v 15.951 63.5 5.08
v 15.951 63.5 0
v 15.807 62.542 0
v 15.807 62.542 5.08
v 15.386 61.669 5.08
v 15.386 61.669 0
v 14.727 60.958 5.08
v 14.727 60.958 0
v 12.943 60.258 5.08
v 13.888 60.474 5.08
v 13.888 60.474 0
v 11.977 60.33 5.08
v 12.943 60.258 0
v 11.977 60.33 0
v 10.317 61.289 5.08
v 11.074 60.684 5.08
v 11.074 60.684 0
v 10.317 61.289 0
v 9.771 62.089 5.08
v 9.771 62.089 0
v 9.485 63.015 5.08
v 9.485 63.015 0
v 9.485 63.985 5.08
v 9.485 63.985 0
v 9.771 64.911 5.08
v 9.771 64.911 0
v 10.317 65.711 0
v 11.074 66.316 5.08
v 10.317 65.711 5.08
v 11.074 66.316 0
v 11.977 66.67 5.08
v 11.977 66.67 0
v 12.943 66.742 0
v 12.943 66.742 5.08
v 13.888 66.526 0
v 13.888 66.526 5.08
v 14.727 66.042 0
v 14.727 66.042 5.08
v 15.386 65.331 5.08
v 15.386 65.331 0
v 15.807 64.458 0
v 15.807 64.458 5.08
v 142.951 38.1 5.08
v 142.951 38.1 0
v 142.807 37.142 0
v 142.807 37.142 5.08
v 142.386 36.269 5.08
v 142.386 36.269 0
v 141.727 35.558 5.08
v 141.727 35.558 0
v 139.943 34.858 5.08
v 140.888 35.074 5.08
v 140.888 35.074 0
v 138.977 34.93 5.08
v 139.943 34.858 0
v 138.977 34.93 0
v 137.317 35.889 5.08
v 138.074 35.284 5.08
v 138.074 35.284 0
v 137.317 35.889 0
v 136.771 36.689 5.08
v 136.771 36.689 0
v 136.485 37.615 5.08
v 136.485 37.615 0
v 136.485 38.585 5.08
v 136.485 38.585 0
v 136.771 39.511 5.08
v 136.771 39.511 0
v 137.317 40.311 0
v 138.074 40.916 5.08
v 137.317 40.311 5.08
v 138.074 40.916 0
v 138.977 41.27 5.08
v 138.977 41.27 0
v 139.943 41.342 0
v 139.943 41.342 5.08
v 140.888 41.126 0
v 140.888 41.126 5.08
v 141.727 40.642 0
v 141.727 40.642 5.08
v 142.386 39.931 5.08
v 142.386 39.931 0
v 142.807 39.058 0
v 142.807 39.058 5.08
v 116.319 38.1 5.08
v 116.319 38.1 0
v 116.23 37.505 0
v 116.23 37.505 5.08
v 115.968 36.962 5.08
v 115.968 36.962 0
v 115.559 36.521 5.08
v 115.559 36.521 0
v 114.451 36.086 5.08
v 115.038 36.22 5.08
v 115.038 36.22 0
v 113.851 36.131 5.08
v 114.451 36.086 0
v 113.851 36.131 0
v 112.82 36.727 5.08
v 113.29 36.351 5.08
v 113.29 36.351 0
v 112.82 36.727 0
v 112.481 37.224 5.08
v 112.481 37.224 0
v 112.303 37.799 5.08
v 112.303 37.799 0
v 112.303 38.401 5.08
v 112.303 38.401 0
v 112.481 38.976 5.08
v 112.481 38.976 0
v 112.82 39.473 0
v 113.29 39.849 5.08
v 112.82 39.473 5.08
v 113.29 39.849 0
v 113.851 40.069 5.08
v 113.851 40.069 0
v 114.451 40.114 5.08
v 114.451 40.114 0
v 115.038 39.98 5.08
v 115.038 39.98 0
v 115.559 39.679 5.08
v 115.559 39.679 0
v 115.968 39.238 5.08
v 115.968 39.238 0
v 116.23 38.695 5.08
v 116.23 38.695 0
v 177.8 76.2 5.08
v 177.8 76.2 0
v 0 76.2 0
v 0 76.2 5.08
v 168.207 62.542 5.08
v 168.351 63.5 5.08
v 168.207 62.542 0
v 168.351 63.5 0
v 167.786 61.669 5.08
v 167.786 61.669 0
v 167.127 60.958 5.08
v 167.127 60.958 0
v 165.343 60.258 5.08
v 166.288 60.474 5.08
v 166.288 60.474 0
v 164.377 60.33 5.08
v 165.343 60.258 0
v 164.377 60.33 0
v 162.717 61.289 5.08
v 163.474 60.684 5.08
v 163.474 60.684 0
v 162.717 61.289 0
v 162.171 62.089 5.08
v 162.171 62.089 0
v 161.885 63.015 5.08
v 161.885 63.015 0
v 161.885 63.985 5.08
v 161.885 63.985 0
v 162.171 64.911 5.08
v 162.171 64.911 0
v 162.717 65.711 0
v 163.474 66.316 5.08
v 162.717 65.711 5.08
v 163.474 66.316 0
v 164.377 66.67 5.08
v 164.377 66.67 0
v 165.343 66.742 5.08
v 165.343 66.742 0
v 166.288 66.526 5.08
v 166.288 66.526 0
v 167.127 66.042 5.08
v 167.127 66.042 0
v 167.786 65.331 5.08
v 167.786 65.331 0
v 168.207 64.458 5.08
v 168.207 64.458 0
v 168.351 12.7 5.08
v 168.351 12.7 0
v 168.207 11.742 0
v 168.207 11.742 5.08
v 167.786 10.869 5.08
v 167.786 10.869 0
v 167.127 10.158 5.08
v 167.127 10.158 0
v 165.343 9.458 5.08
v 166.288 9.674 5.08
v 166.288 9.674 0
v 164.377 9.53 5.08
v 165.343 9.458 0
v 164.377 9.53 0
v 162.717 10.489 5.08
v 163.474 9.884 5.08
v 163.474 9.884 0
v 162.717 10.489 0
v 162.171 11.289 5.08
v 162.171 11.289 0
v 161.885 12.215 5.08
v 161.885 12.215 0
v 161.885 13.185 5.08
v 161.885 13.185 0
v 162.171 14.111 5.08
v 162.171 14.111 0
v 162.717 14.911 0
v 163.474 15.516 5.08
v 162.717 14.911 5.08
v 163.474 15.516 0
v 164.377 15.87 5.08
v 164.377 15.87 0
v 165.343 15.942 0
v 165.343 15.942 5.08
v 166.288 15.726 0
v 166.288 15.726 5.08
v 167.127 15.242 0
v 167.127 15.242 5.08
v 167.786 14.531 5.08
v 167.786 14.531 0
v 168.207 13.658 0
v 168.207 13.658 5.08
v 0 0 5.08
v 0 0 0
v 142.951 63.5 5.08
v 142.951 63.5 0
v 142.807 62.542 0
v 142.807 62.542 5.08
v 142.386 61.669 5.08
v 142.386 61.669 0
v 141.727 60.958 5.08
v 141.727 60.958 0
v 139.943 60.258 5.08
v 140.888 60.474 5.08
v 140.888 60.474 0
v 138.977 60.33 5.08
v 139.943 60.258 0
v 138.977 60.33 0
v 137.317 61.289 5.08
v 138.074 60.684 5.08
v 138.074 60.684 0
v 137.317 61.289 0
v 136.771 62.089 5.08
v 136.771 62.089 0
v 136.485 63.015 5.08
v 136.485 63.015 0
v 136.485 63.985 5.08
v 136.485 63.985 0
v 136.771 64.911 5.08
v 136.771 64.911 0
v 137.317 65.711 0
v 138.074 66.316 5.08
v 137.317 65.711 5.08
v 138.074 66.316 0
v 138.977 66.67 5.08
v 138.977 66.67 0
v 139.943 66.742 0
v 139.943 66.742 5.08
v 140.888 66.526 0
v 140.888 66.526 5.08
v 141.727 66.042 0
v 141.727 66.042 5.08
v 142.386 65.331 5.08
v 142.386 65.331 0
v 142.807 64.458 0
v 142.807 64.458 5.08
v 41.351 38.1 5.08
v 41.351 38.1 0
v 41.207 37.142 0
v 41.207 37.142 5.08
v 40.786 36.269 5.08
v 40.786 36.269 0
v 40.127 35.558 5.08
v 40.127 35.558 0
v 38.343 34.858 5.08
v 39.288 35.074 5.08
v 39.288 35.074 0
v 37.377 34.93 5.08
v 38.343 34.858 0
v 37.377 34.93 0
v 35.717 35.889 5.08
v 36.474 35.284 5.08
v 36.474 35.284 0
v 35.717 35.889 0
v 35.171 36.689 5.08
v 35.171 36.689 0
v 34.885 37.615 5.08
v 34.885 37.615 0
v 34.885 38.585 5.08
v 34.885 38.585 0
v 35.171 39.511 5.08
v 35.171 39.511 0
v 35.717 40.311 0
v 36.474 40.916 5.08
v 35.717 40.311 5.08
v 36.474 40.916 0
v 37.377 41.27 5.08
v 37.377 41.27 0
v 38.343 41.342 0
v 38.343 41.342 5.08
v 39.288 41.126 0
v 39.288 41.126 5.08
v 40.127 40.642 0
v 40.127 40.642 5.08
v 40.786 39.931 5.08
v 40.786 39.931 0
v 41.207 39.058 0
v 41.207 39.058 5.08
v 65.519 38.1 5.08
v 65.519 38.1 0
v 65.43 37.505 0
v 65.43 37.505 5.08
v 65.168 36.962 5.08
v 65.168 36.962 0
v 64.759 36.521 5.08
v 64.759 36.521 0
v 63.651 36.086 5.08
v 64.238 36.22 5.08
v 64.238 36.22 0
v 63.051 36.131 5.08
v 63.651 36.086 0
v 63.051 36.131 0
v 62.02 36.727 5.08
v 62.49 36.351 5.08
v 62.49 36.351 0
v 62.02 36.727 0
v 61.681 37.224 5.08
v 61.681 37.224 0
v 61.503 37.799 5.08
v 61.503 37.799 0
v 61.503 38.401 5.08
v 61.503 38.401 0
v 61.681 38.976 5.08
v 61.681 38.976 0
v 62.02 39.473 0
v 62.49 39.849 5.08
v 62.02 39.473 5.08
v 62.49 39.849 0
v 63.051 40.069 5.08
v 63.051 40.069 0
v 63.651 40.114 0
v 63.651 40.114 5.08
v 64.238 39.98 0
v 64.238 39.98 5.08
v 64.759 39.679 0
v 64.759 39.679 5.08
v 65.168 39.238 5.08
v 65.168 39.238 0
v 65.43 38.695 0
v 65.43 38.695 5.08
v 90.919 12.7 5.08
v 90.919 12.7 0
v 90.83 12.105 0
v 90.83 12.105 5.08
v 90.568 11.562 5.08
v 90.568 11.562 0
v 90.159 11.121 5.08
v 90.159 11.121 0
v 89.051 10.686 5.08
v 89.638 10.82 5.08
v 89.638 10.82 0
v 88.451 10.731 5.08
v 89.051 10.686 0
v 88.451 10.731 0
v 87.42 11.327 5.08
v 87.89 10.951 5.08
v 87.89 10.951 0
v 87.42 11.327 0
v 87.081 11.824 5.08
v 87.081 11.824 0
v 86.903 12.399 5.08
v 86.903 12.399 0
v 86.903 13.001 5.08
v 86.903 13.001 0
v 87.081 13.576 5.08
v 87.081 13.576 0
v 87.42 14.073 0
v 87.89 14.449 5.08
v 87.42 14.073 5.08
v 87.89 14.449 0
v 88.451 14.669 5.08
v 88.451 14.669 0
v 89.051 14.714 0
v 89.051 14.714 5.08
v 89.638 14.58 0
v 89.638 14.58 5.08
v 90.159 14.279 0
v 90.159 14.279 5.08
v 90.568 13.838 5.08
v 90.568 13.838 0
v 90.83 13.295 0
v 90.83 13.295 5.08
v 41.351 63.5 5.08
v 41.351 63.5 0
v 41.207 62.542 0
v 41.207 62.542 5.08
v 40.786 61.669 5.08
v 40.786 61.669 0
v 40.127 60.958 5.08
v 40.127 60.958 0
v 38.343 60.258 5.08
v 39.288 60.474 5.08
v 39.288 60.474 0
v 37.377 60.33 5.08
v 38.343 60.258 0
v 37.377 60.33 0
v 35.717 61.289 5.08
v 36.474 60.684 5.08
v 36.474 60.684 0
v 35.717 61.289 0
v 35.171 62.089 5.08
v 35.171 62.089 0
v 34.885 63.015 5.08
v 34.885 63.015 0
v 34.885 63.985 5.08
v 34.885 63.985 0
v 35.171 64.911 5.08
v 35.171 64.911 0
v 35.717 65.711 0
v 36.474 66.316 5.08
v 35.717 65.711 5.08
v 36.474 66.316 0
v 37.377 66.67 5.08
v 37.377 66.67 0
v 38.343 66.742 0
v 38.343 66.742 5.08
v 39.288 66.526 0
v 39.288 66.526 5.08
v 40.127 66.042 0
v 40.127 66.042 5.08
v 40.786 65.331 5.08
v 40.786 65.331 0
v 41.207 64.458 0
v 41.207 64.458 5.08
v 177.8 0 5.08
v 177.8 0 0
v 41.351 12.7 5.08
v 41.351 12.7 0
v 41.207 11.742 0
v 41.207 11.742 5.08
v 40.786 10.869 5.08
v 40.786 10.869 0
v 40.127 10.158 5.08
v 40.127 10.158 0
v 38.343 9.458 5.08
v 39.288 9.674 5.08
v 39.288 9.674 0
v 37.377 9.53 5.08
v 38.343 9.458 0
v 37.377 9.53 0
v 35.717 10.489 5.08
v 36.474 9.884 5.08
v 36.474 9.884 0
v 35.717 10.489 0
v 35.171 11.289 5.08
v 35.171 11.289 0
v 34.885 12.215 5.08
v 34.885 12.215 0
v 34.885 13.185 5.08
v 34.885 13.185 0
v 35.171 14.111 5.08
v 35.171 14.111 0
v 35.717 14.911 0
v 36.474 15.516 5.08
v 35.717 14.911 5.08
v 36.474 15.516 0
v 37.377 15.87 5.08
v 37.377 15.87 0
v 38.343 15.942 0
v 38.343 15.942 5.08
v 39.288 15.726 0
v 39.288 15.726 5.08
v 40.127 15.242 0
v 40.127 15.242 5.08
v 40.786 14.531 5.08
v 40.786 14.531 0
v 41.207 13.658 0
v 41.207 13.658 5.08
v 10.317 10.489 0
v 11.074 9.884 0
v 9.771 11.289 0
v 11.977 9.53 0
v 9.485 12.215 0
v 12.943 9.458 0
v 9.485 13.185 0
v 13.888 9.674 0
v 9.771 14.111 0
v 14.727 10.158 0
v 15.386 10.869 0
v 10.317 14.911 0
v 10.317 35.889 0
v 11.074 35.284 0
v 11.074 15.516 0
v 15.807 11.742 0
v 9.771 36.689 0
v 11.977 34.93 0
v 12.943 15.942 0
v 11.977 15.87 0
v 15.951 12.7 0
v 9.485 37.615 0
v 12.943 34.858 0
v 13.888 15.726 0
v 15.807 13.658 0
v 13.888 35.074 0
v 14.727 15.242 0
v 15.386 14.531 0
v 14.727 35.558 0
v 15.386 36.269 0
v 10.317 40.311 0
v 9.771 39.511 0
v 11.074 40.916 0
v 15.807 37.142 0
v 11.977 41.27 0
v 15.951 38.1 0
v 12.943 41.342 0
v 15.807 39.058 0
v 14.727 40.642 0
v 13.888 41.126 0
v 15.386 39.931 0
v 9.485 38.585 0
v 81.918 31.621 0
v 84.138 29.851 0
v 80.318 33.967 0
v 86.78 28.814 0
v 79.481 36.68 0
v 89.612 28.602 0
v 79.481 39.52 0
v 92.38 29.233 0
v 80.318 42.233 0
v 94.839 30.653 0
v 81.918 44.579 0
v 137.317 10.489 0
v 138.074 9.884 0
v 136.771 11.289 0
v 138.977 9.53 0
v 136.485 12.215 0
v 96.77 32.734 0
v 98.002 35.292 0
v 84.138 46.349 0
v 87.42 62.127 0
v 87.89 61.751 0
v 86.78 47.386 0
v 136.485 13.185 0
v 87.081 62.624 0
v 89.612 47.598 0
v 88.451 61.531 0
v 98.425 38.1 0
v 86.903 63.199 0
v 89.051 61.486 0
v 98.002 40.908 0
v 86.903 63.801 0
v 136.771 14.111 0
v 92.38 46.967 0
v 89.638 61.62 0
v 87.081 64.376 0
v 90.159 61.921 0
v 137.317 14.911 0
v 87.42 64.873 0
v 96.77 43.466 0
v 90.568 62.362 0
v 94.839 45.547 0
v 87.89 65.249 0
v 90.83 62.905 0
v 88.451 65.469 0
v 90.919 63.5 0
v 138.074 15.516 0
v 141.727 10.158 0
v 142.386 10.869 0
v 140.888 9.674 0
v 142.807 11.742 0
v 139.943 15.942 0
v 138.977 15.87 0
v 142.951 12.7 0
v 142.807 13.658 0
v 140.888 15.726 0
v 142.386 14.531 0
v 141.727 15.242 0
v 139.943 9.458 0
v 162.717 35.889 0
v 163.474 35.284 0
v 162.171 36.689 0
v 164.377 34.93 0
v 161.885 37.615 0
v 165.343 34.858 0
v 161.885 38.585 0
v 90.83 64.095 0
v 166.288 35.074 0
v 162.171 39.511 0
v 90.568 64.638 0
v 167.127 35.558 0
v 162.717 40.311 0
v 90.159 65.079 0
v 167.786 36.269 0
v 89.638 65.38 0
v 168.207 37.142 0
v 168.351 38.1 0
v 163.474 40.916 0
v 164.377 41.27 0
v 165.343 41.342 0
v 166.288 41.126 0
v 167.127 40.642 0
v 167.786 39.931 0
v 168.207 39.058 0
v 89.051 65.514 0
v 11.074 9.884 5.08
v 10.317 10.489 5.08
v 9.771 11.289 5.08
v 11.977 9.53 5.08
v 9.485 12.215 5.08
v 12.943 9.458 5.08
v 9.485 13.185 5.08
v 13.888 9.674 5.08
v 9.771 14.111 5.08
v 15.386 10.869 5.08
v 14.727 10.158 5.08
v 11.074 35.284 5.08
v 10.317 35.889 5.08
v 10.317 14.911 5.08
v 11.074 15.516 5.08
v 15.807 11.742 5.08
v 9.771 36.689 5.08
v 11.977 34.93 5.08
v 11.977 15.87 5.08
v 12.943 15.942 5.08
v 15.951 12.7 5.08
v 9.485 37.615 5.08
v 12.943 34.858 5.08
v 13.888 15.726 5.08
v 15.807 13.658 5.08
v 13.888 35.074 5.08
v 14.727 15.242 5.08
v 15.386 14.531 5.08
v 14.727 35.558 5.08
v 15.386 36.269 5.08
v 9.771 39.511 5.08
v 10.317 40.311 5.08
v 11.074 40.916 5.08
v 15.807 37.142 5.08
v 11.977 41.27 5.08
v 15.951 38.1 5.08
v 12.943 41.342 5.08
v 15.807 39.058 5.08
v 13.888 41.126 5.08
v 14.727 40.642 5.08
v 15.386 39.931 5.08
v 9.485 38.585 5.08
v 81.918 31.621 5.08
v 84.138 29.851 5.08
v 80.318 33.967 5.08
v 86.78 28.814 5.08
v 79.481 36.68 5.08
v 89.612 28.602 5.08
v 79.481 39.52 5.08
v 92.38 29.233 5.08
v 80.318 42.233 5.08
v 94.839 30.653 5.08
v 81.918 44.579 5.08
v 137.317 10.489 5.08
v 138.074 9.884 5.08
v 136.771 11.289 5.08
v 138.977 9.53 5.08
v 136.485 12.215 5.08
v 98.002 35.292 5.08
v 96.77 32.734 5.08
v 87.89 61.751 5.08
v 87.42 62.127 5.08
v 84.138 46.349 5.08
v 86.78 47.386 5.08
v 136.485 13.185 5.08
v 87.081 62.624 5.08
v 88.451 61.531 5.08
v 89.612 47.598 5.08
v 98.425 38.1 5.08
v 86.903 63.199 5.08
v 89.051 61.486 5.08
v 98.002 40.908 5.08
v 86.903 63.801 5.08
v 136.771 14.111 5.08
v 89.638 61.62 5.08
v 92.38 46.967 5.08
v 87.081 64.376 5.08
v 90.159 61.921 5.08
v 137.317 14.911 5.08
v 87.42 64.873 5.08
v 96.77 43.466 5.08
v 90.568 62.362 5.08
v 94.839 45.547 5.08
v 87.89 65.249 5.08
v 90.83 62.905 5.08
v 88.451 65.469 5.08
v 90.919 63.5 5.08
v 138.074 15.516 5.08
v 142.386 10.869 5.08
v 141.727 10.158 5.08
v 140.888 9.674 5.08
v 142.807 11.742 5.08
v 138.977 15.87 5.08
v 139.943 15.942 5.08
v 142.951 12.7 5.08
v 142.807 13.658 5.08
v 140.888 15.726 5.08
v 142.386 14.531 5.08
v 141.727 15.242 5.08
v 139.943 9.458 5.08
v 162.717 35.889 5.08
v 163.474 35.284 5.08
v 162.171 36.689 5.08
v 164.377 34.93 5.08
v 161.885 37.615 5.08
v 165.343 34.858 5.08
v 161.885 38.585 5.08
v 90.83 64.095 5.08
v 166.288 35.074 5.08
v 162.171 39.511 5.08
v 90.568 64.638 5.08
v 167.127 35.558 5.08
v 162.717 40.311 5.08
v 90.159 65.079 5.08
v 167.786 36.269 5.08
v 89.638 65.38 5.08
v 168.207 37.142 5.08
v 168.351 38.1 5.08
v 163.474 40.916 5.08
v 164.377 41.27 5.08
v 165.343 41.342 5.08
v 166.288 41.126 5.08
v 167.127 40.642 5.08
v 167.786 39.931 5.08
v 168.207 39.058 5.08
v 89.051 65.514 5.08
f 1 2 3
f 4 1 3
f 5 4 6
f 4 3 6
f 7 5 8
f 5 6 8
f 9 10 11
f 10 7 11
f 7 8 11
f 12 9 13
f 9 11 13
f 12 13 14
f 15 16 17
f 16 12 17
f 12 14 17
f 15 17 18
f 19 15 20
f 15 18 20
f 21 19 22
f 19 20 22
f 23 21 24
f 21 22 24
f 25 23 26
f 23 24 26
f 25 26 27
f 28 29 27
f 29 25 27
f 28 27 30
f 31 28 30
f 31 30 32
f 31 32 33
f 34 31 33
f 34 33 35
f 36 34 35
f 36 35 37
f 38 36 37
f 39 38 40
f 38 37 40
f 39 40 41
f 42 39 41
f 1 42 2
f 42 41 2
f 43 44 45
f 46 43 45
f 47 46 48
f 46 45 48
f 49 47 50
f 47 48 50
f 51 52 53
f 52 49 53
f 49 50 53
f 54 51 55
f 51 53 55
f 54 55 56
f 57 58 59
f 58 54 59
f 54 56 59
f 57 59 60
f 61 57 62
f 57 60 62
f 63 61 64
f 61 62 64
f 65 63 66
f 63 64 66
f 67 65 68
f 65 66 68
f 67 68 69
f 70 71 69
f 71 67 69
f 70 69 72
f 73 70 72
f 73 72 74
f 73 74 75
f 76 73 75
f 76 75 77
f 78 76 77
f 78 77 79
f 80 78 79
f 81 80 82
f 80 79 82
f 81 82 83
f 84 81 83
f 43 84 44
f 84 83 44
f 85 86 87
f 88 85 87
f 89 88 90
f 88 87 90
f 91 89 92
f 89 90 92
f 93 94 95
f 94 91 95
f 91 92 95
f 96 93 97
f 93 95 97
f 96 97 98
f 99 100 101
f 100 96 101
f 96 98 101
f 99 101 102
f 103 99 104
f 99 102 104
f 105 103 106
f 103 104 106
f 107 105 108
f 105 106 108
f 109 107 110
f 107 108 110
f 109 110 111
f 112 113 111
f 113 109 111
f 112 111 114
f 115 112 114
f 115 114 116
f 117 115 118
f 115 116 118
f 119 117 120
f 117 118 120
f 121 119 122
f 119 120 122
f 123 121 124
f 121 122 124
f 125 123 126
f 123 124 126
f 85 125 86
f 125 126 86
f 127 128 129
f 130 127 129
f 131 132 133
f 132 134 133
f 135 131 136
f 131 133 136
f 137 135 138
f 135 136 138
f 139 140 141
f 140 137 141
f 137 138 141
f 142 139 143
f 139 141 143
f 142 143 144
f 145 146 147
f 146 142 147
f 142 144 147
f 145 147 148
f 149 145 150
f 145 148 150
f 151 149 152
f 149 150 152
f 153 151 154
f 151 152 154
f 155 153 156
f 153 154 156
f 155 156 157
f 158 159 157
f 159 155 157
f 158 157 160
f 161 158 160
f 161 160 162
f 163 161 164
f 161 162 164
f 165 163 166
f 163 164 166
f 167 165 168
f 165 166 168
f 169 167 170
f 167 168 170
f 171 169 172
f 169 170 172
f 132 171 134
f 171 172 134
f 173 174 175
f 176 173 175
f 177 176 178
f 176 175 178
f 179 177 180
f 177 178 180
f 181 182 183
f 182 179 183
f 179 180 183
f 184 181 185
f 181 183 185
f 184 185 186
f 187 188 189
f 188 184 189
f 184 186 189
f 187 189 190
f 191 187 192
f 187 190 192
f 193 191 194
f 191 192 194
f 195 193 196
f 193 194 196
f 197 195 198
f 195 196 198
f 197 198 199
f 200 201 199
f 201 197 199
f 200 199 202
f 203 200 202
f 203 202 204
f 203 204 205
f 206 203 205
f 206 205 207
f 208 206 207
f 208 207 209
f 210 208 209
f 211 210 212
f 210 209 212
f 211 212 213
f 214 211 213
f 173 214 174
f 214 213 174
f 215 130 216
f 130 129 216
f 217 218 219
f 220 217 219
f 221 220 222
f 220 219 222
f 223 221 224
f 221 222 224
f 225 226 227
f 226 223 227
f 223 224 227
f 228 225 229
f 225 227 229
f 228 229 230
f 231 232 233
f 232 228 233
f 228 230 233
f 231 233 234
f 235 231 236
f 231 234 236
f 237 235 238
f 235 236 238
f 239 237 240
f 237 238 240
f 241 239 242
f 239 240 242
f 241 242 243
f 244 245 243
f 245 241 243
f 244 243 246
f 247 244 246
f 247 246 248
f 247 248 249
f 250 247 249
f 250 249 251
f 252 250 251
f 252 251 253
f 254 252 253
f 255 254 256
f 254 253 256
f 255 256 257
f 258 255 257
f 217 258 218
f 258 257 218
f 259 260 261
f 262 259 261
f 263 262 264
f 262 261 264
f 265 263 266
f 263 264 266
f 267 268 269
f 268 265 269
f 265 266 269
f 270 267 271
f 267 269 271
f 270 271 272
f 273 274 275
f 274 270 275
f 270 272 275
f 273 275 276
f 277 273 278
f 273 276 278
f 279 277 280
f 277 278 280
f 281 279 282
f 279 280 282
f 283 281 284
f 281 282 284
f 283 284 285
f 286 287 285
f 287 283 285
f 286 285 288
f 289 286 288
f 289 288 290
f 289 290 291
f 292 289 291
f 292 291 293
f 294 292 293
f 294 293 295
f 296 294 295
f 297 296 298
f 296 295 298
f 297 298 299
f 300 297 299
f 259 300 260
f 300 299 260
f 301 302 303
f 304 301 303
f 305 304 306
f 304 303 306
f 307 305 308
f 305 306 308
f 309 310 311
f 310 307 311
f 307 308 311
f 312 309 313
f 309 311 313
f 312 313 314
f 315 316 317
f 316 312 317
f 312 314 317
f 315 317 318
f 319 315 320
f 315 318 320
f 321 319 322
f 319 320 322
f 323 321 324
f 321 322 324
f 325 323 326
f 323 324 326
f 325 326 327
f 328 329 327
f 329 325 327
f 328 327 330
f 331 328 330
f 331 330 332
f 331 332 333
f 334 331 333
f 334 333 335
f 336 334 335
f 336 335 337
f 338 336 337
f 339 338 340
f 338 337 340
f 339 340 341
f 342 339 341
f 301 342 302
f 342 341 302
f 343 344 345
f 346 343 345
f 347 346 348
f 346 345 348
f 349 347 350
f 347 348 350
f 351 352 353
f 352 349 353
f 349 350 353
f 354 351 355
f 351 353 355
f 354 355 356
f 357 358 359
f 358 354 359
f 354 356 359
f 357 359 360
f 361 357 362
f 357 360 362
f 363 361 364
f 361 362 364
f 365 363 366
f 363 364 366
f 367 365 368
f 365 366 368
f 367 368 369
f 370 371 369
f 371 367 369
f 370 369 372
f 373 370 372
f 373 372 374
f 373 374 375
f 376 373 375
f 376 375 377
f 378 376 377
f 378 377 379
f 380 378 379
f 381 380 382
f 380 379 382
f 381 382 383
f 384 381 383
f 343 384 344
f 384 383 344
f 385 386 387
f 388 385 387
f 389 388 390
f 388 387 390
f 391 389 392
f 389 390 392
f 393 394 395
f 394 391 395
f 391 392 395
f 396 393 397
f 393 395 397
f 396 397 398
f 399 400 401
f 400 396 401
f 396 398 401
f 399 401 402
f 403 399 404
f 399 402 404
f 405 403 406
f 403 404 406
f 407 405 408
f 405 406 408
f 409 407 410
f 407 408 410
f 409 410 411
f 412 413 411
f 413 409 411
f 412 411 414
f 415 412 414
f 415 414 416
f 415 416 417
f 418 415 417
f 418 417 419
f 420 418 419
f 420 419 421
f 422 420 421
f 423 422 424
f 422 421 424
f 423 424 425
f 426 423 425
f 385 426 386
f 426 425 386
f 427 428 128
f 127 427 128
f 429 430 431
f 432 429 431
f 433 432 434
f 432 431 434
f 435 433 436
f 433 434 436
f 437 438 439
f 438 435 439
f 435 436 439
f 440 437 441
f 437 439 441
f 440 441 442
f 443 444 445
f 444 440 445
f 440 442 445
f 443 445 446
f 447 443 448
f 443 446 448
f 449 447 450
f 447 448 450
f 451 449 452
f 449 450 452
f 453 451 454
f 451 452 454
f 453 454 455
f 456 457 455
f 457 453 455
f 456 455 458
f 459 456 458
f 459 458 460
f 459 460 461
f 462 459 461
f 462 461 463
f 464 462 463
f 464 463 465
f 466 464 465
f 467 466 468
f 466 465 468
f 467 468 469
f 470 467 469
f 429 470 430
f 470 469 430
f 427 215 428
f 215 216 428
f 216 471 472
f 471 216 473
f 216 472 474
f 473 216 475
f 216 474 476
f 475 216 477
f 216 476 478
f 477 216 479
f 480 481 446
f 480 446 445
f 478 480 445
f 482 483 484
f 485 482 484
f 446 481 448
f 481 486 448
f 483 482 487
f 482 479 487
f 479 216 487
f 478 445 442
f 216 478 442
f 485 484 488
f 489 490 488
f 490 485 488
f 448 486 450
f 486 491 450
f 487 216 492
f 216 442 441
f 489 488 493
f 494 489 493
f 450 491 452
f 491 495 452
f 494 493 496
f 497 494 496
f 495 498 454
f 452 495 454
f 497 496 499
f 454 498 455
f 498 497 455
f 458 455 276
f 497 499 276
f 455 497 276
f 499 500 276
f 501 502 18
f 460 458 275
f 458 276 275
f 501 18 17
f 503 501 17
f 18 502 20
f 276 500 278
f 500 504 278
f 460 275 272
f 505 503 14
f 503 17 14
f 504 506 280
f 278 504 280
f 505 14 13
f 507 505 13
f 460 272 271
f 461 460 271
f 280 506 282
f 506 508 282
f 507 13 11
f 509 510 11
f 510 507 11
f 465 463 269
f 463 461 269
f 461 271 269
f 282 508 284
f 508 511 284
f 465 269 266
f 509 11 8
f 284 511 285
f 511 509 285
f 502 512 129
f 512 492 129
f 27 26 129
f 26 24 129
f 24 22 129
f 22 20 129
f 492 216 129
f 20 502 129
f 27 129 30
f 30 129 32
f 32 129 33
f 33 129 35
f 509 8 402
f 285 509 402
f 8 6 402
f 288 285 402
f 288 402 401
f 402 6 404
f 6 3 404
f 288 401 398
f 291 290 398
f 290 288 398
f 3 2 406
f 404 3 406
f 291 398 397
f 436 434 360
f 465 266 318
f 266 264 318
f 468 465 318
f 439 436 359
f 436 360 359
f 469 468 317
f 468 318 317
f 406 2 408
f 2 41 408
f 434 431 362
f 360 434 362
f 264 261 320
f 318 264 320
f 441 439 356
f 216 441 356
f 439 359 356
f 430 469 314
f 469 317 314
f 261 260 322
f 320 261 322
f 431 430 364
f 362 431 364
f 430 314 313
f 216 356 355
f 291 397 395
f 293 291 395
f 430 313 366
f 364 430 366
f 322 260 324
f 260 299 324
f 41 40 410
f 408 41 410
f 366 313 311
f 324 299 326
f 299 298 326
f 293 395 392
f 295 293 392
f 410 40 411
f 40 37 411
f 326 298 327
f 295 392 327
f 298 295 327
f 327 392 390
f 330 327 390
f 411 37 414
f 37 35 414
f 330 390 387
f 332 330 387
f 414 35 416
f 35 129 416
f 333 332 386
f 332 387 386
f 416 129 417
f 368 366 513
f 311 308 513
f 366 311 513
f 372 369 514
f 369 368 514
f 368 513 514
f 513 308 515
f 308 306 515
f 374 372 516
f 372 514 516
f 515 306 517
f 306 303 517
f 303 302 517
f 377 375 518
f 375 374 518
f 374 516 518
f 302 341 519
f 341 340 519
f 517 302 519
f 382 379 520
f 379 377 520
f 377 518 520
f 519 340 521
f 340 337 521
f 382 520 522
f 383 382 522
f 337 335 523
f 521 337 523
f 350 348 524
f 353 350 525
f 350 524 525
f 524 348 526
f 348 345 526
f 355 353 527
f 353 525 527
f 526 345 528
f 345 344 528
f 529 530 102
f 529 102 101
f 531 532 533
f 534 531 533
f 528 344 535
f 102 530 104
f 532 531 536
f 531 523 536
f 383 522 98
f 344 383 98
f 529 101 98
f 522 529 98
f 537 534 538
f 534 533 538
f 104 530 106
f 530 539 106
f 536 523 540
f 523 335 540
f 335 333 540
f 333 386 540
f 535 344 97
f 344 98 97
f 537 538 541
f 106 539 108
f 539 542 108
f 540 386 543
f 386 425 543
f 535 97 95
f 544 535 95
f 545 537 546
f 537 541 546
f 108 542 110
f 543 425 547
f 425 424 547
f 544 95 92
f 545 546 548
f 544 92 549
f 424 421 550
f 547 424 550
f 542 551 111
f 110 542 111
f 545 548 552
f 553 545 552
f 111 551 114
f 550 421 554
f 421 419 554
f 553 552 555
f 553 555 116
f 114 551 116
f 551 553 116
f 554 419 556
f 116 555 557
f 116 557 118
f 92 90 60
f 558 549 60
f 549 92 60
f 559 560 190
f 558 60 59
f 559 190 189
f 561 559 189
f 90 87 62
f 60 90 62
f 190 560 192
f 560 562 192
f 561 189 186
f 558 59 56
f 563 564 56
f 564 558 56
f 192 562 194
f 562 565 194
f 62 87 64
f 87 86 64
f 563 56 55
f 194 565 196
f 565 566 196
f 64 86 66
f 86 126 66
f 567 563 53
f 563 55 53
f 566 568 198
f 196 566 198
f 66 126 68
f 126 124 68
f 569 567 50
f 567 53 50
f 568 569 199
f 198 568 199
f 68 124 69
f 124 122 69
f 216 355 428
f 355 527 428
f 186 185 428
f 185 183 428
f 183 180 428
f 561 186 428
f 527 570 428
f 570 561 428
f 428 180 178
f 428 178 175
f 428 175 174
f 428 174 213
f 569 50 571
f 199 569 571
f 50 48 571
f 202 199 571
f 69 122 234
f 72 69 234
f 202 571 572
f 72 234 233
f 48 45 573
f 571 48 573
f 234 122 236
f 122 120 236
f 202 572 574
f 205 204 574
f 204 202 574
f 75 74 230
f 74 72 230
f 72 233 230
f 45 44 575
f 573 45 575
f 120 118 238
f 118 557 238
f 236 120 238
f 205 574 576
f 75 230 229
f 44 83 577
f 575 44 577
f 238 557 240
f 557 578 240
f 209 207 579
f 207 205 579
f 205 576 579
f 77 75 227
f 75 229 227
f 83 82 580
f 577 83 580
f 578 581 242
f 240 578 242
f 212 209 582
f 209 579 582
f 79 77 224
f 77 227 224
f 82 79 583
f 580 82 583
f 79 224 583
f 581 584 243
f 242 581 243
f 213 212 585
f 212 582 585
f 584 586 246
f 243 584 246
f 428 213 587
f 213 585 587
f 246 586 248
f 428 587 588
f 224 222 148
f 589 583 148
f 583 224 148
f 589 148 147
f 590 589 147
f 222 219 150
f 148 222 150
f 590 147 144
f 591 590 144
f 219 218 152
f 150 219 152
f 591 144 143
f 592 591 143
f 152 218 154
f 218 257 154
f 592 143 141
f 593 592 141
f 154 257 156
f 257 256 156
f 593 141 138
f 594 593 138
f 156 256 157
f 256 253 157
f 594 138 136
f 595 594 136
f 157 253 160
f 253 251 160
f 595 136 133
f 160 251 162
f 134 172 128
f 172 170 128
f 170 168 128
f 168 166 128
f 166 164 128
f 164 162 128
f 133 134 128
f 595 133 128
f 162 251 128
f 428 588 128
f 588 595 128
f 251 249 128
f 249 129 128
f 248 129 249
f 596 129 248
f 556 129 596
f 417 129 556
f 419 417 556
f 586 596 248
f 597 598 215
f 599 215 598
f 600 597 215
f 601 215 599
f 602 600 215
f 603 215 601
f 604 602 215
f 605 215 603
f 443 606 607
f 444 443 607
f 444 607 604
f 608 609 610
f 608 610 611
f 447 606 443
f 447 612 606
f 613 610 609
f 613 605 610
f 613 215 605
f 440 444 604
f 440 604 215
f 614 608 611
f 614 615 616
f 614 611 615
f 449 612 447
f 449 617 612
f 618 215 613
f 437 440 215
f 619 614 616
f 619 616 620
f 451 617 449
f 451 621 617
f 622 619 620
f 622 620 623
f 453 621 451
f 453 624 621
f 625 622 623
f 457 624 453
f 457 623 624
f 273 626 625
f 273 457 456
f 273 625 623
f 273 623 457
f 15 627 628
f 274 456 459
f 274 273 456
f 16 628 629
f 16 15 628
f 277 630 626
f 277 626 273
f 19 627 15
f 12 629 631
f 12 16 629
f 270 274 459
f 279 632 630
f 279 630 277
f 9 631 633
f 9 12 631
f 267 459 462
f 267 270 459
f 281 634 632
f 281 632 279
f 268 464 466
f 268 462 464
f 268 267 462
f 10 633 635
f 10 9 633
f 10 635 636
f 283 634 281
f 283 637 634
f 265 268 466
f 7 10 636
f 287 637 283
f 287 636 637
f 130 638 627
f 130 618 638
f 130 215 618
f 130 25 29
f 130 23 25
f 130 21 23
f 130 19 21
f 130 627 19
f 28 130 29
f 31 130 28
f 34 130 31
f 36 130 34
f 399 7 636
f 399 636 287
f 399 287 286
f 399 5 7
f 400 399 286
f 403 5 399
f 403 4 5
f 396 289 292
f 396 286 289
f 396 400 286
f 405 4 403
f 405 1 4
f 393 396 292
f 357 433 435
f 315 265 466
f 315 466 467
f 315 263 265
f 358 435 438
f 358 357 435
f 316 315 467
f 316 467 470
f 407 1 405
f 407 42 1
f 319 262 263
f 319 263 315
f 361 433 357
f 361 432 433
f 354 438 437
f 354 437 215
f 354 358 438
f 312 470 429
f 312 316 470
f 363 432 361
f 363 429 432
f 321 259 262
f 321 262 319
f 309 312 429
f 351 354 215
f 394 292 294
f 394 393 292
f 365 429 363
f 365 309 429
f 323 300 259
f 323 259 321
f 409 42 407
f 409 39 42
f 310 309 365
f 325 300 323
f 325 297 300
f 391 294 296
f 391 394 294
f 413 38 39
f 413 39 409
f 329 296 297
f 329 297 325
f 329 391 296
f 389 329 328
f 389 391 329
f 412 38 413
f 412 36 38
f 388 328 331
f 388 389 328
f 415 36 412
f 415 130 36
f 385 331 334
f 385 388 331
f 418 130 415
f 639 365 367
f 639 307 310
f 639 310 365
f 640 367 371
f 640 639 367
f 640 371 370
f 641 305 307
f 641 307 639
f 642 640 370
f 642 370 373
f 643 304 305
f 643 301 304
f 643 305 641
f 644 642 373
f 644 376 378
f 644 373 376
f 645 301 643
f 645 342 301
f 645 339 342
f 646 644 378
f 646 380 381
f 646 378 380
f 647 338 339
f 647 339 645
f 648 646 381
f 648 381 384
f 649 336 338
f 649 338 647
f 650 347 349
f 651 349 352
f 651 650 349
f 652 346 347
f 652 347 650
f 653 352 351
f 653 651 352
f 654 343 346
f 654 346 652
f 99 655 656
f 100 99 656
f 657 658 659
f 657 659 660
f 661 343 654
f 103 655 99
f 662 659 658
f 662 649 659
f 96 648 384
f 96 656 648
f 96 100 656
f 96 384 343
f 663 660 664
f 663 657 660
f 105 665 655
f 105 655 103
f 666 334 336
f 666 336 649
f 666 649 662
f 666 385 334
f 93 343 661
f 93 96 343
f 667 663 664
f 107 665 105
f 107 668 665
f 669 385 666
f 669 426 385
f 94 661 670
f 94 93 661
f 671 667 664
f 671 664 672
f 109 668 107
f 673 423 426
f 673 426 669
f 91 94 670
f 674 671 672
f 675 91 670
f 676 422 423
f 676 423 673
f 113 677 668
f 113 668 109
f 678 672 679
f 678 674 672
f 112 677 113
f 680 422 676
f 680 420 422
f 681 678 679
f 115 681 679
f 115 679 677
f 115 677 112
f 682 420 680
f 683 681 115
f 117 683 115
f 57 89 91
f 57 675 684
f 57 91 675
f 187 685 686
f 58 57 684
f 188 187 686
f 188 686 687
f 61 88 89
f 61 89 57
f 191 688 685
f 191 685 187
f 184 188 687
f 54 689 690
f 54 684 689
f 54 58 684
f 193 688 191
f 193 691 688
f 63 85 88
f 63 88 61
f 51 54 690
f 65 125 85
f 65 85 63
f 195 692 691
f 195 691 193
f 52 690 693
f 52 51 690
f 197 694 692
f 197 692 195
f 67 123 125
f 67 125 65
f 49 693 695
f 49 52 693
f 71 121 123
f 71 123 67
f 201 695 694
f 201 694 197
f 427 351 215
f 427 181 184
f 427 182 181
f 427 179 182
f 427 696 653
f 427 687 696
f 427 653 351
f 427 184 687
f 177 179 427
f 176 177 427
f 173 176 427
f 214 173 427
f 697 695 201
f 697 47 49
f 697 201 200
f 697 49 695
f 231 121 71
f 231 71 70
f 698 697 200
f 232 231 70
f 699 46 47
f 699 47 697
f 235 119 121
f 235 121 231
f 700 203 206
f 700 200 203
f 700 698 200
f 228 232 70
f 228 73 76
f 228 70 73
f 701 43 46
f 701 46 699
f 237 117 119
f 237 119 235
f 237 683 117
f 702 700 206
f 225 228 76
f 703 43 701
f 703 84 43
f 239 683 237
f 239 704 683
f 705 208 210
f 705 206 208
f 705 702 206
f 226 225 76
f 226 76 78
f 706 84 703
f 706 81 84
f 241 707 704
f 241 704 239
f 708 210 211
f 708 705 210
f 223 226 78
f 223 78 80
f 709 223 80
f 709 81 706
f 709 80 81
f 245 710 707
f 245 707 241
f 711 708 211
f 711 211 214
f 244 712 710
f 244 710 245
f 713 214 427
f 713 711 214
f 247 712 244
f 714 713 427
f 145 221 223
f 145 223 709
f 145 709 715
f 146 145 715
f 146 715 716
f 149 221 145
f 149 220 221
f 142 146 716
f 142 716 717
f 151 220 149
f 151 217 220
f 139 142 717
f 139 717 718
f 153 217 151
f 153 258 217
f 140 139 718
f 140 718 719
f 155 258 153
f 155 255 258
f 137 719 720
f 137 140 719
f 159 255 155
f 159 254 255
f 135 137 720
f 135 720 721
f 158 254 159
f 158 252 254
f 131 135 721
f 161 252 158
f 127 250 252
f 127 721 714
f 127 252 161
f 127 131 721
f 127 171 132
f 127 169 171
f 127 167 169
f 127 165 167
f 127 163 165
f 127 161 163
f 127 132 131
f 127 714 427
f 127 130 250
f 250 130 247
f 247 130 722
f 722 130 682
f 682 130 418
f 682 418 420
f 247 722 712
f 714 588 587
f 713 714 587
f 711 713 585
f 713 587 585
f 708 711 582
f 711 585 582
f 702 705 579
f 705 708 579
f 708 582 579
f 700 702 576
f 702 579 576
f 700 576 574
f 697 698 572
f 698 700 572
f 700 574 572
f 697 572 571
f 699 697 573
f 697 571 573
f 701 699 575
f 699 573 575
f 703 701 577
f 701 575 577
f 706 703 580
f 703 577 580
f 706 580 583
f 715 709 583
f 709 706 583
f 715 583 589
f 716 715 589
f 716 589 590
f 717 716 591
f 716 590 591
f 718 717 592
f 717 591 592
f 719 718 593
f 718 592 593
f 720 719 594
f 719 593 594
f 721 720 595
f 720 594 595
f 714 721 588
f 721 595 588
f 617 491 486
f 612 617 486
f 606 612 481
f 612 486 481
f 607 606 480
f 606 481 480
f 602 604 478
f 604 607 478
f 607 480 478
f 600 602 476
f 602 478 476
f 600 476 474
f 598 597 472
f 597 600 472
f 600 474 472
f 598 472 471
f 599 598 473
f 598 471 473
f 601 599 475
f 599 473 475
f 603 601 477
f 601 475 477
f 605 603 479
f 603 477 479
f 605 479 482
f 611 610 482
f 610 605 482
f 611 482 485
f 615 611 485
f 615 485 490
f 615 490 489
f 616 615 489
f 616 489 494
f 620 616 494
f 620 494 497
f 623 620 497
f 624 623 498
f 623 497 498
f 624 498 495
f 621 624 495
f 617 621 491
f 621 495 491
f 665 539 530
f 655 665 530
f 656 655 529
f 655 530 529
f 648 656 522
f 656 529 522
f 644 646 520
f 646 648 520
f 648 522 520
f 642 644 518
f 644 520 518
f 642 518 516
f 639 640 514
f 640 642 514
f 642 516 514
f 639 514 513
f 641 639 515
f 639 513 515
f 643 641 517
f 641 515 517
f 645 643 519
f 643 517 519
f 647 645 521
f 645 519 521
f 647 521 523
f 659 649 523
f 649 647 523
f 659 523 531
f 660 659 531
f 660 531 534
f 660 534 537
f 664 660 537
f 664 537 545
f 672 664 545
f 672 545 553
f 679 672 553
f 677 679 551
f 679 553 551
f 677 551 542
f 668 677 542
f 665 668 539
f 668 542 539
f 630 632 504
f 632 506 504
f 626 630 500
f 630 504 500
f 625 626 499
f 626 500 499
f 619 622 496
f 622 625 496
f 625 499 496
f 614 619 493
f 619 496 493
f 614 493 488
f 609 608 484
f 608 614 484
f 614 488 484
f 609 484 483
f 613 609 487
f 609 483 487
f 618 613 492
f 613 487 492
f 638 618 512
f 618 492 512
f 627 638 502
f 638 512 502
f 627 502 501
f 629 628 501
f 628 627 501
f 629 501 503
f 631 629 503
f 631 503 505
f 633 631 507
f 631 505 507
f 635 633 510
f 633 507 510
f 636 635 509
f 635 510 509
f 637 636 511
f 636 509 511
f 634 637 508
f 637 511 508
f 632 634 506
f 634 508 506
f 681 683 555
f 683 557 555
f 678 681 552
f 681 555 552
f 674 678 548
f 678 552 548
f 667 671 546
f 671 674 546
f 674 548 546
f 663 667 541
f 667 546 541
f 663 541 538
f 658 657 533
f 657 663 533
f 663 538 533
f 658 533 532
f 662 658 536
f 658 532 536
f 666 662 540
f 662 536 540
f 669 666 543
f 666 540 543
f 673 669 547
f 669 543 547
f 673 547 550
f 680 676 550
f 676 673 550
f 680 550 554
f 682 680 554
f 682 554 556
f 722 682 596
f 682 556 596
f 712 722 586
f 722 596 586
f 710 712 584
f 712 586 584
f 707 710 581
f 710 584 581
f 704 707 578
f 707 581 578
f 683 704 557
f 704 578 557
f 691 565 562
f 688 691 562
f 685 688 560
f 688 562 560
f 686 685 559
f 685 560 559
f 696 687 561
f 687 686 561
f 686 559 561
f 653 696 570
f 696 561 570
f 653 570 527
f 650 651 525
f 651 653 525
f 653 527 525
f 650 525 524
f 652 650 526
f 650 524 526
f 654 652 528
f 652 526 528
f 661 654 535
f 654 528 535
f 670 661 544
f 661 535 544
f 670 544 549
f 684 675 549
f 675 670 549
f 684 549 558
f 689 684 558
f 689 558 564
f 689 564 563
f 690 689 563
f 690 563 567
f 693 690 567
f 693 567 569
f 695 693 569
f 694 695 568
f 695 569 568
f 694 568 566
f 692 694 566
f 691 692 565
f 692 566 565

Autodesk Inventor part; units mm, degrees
ref_plane "YZ Plane" through (0, 0, 0) normal (1, 0, 0) x (0, 1, 0)
ref_plane "XZ Plane" through (0, 0, 0) normal (0, 1, 0) x (-1, 0, 0)
ref_plane "XY Plane" through (0, 0, 0) normal (0, 0, 1) x (1, 0, 0)
sketch "Sketch1" plane through (0, 0, 0) normal (0, 0, 1) x (1, 0, 0)
  line L0 (0, 0) -> (177.8, 0)
  line L1 (177.8, 0) -> (177.8, 76.2)
  line L2 (177.8, 76.2) -> (0, 76.2)
  line L3 (0, 76.2) -> (0, 0)
  circle A0 centre (88.9, 38.1) radius 9.525
  circle A1 centre (88.9, 63.5) radius 2.0193
  circle A2 centre (63.5, 38.1) radius 2.0193
  circle A3 centre (88.9, 12.7) radius 2.0193
  circle A4 centre (114.3, 38.1) radius 2.0193
  circle A5 centre (12.7, 63.5) radius 3.2512
  circle A6 centre (12.7, 38.1) radius 3.2512
  circle A7 centre (12.7, 12.7) radius 3.2512
  circle A8 centre (38.1, 63.5) radius 3.2512
  circle A9 centre (38.1, 38.1) radius 3.2512
  circle A10 centre (38.1, 12.7) radius 3.2512
  circle A11 centre (165.1, 63.5) radius 3.2512
  circle A12 centre (165.1, 38.1) radius 3.2512
  circle A13 centre (165.1, 12.7) radius 3.2512
  circle A14 centre (139.7, 63.5) radius 3.2512
  circle A15 centre (139.7, 38.1) radius 3.2512
  circle A16 centre (139.7, 12.7) radius 3.2512
  dimension "d0" = 177.8
  dimension "d1" = 76.2
  dimension "d2" = 19.05
  dimension "d3" = 38.1
  dimension "d4" = 88.9
  dimension "d5" = 4.0386
  dimension "d6" = 25.4
  dimension "d7" = 88.9
  dimension "d8" = 4.0386
  dimension "d9" = 25.4
  dimension "d10" = 38.1
  dimension "d13" = 50.8
  dimension "d20" = 50.8
  dimension "d25" = 6.5024
  dimension "d26" = 12.7
  dimension "d27" = 12.7
  dimension "d30" = 25.4
  dimension "d39" = 25.4
  dimension "d48" = 127
  dimension "d55" = 25.4
extrude "Extrusion3" add sketch "Sketch1" along normal blind 5.08
equation "\"d7\" = d4"
equation "\"d8\" = d5"
equation "\"d9\" = d6"
equation "\"d10\" = d3"
properties part number "Motor Mount Long"
